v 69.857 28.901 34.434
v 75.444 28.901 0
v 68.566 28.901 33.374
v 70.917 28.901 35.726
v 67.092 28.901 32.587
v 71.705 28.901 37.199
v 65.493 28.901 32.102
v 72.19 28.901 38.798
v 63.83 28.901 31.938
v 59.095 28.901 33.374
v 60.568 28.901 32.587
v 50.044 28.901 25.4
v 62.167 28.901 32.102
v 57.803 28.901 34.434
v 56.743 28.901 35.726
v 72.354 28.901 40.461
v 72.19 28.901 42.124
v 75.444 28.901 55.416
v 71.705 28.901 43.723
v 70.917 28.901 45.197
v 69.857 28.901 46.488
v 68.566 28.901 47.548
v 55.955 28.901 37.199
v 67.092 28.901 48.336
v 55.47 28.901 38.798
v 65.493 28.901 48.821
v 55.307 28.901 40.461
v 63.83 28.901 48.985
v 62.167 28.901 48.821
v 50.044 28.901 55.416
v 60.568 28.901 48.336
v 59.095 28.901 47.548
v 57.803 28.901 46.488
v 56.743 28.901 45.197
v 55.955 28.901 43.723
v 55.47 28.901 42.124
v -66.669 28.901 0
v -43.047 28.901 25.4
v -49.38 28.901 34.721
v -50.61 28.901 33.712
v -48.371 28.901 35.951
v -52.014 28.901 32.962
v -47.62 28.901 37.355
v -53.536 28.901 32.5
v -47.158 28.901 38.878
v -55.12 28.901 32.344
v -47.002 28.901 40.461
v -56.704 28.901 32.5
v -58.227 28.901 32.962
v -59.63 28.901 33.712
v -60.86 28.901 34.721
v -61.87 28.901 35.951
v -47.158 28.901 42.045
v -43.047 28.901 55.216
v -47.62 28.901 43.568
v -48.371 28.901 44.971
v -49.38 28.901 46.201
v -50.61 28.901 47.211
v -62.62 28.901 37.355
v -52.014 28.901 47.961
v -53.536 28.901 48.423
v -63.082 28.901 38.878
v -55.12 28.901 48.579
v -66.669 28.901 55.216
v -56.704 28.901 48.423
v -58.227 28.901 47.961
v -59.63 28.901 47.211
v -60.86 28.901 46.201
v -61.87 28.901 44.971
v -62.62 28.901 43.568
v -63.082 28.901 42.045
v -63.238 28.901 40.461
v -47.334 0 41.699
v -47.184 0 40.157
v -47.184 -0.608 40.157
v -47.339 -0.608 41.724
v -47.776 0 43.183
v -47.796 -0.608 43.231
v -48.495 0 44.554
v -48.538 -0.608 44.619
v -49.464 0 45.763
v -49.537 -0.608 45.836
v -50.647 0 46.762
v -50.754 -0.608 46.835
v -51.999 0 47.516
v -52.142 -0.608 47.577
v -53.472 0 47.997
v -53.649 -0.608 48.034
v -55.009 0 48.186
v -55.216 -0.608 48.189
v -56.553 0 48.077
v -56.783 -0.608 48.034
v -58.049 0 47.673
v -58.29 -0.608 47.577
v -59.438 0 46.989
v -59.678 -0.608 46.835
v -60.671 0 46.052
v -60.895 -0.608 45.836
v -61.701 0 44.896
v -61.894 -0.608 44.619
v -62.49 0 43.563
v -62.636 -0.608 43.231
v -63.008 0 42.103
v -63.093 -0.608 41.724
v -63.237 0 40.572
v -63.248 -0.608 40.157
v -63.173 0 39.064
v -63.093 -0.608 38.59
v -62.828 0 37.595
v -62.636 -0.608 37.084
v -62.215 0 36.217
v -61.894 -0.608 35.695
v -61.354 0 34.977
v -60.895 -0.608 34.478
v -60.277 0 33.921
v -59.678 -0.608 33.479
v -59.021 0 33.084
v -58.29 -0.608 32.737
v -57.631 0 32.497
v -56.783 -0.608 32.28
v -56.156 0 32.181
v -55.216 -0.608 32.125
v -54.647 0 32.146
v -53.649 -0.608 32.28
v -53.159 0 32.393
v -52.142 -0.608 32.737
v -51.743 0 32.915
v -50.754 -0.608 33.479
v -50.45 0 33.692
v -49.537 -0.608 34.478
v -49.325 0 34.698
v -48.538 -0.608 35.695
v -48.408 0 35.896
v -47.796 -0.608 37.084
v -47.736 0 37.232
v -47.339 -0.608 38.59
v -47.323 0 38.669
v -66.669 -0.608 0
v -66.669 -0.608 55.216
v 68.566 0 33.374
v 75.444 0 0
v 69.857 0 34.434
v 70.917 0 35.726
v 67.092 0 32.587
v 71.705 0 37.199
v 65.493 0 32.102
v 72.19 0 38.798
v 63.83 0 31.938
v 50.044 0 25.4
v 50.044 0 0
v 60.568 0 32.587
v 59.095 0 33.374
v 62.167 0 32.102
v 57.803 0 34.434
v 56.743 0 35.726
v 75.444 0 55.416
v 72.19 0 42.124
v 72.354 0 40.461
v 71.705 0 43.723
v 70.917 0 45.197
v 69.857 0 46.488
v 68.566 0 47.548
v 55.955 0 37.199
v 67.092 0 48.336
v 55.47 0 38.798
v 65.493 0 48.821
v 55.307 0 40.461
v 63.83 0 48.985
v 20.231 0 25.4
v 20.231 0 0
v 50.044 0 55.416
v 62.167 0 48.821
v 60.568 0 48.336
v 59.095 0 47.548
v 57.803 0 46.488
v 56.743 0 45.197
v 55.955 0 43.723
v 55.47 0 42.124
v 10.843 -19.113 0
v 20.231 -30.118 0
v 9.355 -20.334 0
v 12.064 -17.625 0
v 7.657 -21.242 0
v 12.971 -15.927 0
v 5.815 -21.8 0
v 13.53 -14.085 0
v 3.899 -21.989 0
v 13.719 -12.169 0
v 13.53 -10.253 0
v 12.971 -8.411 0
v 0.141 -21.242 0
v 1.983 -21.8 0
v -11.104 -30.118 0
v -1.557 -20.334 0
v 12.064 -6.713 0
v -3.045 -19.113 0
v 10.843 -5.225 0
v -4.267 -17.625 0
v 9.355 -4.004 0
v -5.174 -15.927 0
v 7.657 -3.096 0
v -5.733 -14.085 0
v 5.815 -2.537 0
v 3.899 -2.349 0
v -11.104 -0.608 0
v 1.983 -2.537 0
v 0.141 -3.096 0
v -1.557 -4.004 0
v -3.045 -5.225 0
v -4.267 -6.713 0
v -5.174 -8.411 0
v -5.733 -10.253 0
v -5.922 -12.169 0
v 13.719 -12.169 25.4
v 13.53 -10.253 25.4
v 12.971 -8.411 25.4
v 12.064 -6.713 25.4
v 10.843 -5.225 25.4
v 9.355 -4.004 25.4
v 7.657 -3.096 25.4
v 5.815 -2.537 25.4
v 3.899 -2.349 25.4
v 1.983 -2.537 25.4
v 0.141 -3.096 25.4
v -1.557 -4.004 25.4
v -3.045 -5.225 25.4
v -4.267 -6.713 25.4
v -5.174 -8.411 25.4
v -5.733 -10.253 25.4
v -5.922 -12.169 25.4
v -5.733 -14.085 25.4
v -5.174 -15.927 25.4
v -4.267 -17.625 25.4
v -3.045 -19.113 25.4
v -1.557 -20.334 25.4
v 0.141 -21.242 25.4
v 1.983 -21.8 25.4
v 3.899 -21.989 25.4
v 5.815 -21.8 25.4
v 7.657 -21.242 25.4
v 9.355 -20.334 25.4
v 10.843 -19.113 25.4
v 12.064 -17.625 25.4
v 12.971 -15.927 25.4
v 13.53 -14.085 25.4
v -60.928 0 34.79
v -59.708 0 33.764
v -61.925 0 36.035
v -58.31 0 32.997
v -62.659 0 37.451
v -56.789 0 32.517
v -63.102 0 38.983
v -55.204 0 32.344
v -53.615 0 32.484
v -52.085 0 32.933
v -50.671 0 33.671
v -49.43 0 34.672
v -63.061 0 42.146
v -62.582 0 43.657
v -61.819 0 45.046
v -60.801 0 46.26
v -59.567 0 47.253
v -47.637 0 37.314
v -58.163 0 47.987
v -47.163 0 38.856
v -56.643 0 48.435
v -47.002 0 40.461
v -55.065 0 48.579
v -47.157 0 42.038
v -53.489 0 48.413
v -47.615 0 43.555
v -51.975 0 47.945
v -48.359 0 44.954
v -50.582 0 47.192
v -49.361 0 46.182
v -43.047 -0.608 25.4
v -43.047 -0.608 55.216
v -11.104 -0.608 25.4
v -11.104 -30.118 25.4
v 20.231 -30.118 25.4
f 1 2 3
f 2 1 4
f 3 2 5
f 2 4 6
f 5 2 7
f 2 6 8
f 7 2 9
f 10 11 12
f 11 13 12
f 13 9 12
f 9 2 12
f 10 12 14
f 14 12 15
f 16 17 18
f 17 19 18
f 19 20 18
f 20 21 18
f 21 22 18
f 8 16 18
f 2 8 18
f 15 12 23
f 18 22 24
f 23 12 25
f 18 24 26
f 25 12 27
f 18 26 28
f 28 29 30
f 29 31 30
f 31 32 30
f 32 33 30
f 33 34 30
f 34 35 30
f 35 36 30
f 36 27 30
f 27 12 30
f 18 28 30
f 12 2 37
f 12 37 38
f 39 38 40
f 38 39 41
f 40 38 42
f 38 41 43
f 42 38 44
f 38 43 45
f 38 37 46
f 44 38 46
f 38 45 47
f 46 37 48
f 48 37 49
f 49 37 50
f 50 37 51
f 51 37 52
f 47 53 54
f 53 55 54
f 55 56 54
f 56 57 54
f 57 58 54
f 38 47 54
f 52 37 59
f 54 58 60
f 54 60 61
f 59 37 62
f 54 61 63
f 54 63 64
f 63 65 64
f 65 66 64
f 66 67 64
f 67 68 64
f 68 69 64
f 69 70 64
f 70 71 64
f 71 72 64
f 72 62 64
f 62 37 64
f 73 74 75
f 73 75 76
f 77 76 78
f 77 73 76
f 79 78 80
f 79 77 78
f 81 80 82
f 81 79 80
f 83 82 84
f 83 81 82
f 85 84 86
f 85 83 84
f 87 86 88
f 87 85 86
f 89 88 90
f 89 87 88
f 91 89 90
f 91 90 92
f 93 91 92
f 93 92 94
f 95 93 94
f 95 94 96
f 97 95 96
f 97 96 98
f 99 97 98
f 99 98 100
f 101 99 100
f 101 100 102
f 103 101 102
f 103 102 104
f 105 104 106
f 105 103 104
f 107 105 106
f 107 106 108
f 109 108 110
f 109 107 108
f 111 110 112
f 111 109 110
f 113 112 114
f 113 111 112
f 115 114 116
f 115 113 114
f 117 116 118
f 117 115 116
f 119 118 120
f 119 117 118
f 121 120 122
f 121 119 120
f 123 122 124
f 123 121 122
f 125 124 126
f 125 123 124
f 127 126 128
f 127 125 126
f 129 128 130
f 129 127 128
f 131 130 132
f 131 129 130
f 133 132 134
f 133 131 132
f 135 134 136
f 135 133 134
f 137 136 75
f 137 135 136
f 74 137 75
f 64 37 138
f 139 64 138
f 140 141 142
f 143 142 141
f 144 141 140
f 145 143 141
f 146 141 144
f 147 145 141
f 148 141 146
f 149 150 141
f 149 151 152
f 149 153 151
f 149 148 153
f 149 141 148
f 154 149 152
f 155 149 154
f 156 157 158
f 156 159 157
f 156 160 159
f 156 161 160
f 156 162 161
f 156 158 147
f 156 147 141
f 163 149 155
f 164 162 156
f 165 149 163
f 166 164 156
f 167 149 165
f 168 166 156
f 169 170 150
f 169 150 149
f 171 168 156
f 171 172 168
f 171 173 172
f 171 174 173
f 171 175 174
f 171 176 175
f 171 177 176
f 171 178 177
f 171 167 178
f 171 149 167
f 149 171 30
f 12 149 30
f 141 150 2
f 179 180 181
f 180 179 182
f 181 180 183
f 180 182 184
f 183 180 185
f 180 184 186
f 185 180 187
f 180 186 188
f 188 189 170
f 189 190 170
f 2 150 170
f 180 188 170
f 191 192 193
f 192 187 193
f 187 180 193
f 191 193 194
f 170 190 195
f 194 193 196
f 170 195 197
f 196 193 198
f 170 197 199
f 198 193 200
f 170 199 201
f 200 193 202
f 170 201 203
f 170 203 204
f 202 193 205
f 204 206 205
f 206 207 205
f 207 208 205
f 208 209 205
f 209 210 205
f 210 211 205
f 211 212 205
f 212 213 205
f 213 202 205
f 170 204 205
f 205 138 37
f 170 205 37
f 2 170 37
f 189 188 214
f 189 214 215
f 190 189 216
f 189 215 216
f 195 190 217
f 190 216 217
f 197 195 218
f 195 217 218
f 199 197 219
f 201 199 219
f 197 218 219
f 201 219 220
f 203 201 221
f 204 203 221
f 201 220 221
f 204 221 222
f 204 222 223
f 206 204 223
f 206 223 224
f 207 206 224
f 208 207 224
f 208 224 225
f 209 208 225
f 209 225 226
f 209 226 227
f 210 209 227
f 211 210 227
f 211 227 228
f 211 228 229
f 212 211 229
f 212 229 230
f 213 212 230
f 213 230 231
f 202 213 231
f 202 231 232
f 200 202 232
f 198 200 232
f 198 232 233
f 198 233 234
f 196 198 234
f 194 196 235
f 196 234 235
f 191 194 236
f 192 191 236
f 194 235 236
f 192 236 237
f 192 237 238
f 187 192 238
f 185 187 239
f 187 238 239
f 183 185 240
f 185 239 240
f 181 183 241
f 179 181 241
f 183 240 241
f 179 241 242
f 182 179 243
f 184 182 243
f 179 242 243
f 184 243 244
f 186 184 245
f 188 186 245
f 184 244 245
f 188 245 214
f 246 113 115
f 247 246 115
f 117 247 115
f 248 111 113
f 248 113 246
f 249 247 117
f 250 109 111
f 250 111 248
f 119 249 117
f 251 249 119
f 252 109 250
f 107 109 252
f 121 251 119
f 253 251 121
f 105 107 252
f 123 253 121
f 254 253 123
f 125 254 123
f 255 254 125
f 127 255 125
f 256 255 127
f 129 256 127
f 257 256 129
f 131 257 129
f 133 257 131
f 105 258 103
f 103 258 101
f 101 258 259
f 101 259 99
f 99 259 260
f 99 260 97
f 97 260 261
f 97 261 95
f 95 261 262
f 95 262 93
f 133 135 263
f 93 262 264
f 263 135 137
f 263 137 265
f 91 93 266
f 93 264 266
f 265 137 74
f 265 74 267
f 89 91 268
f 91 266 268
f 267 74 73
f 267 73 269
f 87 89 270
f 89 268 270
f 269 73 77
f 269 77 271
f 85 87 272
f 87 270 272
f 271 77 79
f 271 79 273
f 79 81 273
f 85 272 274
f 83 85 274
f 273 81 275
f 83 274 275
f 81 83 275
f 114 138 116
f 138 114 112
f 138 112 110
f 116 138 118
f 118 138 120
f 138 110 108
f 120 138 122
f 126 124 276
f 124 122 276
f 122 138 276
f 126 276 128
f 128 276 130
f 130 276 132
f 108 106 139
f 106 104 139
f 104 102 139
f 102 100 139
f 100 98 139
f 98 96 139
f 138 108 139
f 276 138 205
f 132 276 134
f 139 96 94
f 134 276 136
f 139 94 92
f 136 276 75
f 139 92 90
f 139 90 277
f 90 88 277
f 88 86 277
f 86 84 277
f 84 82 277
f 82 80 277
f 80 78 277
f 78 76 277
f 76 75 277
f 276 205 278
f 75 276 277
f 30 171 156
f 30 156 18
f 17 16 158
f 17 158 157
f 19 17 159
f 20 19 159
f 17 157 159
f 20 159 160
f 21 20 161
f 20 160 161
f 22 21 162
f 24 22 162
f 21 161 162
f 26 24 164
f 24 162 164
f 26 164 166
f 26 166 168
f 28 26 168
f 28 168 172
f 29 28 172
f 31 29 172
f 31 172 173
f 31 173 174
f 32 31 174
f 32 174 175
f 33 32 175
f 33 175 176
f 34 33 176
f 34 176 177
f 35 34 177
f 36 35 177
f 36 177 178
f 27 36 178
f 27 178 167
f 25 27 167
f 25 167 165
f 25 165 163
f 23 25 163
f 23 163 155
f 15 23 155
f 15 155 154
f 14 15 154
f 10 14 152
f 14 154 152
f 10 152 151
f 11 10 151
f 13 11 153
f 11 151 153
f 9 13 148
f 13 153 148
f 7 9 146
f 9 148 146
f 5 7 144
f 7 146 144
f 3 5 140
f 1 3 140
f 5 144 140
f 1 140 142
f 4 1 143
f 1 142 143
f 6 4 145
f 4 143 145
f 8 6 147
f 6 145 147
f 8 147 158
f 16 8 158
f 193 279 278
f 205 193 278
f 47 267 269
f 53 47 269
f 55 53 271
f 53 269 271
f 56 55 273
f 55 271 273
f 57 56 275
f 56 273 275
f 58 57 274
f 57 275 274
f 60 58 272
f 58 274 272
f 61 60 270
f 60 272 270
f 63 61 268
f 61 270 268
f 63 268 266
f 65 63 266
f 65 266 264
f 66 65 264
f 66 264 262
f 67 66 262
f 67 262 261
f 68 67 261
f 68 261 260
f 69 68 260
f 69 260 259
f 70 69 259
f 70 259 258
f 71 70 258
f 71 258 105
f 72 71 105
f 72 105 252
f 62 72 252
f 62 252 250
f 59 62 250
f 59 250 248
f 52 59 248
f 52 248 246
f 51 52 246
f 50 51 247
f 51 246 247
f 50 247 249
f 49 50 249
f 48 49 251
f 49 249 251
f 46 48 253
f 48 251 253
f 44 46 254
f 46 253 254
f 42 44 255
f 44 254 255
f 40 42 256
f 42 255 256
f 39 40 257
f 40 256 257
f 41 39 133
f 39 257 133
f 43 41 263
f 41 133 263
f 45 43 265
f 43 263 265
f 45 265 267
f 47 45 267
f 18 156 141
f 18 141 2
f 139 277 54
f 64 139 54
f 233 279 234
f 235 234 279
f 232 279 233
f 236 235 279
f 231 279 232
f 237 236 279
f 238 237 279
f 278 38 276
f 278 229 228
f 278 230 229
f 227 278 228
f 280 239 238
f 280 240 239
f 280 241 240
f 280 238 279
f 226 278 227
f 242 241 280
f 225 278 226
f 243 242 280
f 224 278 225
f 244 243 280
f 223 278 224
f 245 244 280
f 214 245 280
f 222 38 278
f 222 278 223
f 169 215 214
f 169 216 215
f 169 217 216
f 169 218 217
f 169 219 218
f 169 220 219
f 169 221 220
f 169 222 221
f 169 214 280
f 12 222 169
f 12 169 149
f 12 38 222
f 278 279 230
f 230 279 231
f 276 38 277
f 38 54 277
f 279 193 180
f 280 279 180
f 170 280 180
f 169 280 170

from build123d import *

# Parameters (mm, degrees)
F0_W      = 93.0914841592
F0_H      = 59.018785134
F1_DEPTH  = 25.4
F2_W      = 29.8136137426
F2_H      = 30.1178339869
F2_W_2    = 31.9431554526
F2_H_2    = 29.509392567
F3_DEPTH  = 25.4
F5_DEPTH  = 23.622
F6_W      = 28.9009511471
F6_H      = 55.4156415164
F7_DEPTH  = 25.4
F8_R      = 9.8202471376
F9_DEPTH  = 33.528
F10_R     = 8.1176194913
F10_R_2   = 8.5236088485
F11_DEPTH = 38.1
F12_R     = 8.0316605079
F13_DEPTH = 60.96


with BuildPart() as f1:
    # F0 (on Top) → F1 (new body)
    with BuildSketch(Plane.XY):
        with Locations((3.4985374659, -0.6084414199)):
            Rectangle(F0_W, F0_H)
    extrude(amount=F1_DEPTH)

    # F2 (on face) → F3 (cut)
    with BuildSketch(Plane.XY.offset(25.4)):
        with Locations((35.1374726743, -15.0589169934)):
            Rectangle(F2_W, F2_H)
        with Locations((-27.0756268874, -15.3631377034)):
            Rectangle(F2_W_2, F2_H_2)
    extrude(amount=-F3_DEPTH, mode=Mode.SUBTRACT)

    # F4 (on face) → F5 (join)
    with BuildSketch(Plane(origin=(-43.0472046137, 0, 0), x_dir=(0, -1, 0), z_dir=(-1, 0, 0))):
        Polygon((0, 0), (0.6084414199, 0), (0.6084414199, 55.2160292864), align=None)
        Polygon((0, 0), (0.6084414199, 55.2160292864), (-28.9009511471, 55.2160292864), (-28.9009511471, 0), align=None)
    extrude(amount=F5_DEPTH)

    # F6 (on face) → F7 (join)
    with BuildSketch(Plane.YZ.offset(50.0442795455)):
        with Locations((14.4504755735, 27.7078207582)):
            Rectangle(F6_W, F6_H)
    extrude(amount=F7_DEPTH)

    # F8 (on face) → F9 (cut)
    with BuildSketch(Plane.XY.offset(25.4)):
        with Locations((3.8986797445, -12.1688209474)):
            Circle(F8_R)
    extrude(amount=-F9_DEPTH, mode=Mode.SUBTRACT)

    # F10 (on Front) → F11 (cut)
    with BuildSketch(Plane.XZ):
        with Locations((-55.1201030612, 40.4613353312)):
            Circle(F10_R)
        with Locations((63.8301223516, 40.4613353312)):
            Circle(F10_R_2)
    extrude(amount=-F11_DEPTH, mode=Mode.SUBTRACT)

    # F12 (on Front) → F13 (cut)
    with BuildSketch(Plane.XZ):
        with Locations((-55.2160218358, 40.1571132243)):
            Circle(F12_R)
    extrude(amount=F13_DEPTH, mode=Mode.SUBTRACT)


solid = f1.part
